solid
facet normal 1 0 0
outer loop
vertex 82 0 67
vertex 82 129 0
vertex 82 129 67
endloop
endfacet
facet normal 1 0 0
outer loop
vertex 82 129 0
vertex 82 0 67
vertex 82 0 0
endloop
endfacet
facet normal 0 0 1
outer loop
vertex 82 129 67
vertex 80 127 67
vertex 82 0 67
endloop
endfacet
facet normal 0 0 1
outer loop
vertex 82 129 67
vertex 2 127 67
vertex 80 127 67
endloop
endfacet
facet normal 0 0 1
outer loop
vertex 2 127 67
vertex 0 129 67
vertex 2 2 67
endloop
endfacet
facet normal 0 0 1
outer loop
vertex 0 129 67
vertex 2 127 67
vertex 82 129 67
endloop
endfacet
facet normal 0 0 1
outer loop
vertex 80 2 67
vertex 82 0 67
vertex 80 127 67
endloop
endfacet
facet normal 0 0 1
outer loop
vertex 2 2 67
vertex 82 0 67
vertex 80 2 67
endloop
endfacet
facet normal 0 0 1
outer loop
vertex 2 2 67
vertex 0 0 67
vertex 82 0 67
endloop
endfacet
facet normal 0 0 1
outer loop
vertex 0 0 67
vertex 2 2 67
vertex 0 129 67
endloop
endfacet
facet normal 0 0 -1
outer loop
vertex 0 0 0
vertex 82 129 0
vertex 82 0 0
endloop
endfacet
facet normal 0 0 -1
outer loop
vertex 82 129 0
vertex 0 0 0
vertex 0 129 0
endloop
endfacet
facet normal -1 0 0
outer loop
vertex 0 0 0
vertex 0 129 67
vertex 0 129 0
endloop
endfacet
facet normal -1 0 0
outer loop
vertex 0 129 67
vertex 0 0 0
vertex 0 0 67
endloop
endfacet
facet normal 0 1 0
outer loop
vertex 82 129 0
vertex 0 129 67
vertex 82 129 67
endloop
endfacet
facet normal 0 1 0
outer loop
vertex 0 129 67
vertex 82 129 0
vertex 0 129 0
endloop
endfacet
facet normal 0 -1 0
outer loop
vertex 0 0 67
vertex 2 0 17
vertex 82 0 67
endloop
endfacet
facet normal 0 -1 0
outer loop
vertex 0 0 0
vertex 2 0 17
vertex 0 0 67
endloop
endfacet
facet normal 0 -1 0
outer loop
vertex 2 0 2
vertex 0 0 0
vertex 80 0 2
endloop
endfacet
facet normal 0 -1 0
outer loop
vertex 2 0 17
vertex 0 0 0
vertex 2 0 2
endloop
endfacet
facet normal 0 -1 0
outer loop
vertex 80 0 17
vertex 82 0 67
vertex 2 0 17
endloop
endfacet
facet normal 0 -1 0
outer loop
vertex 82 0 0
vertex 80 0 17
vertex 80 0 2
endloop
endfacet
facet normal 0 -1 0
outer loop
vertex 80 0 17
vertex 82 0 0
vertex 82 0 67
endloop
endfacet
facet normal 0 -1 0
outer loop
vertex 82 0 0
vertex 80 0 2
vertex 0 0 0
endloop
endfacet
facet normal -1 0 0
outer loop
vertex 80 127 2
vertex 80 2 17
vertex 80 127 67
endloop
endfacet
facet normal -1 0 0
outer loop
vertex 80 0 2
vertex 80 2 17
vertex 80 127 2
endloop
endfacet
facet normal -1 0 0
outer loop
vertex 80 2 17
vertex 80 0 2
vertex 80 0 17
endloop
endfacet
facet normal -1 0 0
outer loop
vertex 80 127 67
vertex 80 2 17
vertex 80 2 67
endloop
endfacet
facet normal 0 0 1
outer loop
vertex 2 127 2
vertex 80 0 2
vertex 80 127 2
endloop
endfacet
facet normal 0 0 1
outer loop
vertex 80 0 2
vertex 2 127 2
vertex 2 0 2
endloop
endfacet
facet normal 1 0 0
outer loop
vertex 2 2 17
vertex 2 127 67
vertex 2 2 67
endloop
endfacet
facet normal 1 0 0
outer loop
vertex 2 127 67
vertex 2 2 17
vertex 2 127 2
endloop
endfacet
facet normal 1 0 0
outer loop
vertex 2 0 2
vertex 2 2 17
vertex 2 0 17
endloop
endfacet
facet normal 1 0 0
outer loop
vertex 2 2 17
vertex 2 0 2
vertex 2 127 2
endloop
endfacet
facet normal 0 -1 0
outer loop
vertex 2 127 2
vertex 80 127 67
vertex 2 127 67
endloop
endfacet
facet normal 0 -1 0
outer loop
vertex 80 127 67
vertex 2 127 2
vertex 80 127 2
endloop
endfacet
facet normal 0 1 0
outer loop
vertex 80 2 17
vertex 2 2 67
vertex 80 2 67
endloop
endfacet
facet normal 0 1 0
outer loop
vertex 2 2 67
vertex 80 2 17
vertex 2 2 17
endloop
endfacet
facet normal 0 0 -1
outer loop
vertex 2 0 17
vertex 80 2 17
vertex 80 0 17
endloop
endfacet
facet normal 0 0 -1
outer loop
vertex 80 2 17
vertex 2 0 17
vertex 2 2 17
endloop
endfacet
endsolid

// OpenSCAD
// =============================================
// Riftbound Card Sorter — Output Bin
// =============================================
// Print N bins (default 8 + 1 reject)
// Stacks in 2×4 grid within 2ft×2ft footprint
// Front label slot for printed card labels
// Material: PLA, 0.2mm layers, 20% infill (non-structural)
// =============================================

bin_inner_w  = 78;
bin_inner_d  = 125;
bin_inner_h  = 65;
wall         = 2.0;
label_h      = 15;   // front label slot height

outer_w = bin_inner_w + wall * 2;
outer_d = bin_inner_d + wall * 2;
outer_h = bin_inner_h + wall;

module output_bin() {
    difference() {
        cube([outer_w, outer_d, outer_h]);

        // Inner cavity (open top)
        translate([wall, wall, wall])
            cube([bin_inner_w, bin_inner_d, outer_h]);

        // Front label window
        translate([(outer_w - bin_inner_w) / 2, 0, wall])
            cube([bin_inner_w, wall + 0.1, label_h]);

        // Card entry slot (top back, angled) — optional
        // Cards fall in from top, no slot needed
    }
}

output_bin();

// =============================================
// PRINT ORIENTATION: open top facing up
// SUPPORTS: none needed
// PRINT 9× total (8 sort bins + 1 reject)
// EST: ~45 min per bin at 0.3mm draft quality
// =============================================
